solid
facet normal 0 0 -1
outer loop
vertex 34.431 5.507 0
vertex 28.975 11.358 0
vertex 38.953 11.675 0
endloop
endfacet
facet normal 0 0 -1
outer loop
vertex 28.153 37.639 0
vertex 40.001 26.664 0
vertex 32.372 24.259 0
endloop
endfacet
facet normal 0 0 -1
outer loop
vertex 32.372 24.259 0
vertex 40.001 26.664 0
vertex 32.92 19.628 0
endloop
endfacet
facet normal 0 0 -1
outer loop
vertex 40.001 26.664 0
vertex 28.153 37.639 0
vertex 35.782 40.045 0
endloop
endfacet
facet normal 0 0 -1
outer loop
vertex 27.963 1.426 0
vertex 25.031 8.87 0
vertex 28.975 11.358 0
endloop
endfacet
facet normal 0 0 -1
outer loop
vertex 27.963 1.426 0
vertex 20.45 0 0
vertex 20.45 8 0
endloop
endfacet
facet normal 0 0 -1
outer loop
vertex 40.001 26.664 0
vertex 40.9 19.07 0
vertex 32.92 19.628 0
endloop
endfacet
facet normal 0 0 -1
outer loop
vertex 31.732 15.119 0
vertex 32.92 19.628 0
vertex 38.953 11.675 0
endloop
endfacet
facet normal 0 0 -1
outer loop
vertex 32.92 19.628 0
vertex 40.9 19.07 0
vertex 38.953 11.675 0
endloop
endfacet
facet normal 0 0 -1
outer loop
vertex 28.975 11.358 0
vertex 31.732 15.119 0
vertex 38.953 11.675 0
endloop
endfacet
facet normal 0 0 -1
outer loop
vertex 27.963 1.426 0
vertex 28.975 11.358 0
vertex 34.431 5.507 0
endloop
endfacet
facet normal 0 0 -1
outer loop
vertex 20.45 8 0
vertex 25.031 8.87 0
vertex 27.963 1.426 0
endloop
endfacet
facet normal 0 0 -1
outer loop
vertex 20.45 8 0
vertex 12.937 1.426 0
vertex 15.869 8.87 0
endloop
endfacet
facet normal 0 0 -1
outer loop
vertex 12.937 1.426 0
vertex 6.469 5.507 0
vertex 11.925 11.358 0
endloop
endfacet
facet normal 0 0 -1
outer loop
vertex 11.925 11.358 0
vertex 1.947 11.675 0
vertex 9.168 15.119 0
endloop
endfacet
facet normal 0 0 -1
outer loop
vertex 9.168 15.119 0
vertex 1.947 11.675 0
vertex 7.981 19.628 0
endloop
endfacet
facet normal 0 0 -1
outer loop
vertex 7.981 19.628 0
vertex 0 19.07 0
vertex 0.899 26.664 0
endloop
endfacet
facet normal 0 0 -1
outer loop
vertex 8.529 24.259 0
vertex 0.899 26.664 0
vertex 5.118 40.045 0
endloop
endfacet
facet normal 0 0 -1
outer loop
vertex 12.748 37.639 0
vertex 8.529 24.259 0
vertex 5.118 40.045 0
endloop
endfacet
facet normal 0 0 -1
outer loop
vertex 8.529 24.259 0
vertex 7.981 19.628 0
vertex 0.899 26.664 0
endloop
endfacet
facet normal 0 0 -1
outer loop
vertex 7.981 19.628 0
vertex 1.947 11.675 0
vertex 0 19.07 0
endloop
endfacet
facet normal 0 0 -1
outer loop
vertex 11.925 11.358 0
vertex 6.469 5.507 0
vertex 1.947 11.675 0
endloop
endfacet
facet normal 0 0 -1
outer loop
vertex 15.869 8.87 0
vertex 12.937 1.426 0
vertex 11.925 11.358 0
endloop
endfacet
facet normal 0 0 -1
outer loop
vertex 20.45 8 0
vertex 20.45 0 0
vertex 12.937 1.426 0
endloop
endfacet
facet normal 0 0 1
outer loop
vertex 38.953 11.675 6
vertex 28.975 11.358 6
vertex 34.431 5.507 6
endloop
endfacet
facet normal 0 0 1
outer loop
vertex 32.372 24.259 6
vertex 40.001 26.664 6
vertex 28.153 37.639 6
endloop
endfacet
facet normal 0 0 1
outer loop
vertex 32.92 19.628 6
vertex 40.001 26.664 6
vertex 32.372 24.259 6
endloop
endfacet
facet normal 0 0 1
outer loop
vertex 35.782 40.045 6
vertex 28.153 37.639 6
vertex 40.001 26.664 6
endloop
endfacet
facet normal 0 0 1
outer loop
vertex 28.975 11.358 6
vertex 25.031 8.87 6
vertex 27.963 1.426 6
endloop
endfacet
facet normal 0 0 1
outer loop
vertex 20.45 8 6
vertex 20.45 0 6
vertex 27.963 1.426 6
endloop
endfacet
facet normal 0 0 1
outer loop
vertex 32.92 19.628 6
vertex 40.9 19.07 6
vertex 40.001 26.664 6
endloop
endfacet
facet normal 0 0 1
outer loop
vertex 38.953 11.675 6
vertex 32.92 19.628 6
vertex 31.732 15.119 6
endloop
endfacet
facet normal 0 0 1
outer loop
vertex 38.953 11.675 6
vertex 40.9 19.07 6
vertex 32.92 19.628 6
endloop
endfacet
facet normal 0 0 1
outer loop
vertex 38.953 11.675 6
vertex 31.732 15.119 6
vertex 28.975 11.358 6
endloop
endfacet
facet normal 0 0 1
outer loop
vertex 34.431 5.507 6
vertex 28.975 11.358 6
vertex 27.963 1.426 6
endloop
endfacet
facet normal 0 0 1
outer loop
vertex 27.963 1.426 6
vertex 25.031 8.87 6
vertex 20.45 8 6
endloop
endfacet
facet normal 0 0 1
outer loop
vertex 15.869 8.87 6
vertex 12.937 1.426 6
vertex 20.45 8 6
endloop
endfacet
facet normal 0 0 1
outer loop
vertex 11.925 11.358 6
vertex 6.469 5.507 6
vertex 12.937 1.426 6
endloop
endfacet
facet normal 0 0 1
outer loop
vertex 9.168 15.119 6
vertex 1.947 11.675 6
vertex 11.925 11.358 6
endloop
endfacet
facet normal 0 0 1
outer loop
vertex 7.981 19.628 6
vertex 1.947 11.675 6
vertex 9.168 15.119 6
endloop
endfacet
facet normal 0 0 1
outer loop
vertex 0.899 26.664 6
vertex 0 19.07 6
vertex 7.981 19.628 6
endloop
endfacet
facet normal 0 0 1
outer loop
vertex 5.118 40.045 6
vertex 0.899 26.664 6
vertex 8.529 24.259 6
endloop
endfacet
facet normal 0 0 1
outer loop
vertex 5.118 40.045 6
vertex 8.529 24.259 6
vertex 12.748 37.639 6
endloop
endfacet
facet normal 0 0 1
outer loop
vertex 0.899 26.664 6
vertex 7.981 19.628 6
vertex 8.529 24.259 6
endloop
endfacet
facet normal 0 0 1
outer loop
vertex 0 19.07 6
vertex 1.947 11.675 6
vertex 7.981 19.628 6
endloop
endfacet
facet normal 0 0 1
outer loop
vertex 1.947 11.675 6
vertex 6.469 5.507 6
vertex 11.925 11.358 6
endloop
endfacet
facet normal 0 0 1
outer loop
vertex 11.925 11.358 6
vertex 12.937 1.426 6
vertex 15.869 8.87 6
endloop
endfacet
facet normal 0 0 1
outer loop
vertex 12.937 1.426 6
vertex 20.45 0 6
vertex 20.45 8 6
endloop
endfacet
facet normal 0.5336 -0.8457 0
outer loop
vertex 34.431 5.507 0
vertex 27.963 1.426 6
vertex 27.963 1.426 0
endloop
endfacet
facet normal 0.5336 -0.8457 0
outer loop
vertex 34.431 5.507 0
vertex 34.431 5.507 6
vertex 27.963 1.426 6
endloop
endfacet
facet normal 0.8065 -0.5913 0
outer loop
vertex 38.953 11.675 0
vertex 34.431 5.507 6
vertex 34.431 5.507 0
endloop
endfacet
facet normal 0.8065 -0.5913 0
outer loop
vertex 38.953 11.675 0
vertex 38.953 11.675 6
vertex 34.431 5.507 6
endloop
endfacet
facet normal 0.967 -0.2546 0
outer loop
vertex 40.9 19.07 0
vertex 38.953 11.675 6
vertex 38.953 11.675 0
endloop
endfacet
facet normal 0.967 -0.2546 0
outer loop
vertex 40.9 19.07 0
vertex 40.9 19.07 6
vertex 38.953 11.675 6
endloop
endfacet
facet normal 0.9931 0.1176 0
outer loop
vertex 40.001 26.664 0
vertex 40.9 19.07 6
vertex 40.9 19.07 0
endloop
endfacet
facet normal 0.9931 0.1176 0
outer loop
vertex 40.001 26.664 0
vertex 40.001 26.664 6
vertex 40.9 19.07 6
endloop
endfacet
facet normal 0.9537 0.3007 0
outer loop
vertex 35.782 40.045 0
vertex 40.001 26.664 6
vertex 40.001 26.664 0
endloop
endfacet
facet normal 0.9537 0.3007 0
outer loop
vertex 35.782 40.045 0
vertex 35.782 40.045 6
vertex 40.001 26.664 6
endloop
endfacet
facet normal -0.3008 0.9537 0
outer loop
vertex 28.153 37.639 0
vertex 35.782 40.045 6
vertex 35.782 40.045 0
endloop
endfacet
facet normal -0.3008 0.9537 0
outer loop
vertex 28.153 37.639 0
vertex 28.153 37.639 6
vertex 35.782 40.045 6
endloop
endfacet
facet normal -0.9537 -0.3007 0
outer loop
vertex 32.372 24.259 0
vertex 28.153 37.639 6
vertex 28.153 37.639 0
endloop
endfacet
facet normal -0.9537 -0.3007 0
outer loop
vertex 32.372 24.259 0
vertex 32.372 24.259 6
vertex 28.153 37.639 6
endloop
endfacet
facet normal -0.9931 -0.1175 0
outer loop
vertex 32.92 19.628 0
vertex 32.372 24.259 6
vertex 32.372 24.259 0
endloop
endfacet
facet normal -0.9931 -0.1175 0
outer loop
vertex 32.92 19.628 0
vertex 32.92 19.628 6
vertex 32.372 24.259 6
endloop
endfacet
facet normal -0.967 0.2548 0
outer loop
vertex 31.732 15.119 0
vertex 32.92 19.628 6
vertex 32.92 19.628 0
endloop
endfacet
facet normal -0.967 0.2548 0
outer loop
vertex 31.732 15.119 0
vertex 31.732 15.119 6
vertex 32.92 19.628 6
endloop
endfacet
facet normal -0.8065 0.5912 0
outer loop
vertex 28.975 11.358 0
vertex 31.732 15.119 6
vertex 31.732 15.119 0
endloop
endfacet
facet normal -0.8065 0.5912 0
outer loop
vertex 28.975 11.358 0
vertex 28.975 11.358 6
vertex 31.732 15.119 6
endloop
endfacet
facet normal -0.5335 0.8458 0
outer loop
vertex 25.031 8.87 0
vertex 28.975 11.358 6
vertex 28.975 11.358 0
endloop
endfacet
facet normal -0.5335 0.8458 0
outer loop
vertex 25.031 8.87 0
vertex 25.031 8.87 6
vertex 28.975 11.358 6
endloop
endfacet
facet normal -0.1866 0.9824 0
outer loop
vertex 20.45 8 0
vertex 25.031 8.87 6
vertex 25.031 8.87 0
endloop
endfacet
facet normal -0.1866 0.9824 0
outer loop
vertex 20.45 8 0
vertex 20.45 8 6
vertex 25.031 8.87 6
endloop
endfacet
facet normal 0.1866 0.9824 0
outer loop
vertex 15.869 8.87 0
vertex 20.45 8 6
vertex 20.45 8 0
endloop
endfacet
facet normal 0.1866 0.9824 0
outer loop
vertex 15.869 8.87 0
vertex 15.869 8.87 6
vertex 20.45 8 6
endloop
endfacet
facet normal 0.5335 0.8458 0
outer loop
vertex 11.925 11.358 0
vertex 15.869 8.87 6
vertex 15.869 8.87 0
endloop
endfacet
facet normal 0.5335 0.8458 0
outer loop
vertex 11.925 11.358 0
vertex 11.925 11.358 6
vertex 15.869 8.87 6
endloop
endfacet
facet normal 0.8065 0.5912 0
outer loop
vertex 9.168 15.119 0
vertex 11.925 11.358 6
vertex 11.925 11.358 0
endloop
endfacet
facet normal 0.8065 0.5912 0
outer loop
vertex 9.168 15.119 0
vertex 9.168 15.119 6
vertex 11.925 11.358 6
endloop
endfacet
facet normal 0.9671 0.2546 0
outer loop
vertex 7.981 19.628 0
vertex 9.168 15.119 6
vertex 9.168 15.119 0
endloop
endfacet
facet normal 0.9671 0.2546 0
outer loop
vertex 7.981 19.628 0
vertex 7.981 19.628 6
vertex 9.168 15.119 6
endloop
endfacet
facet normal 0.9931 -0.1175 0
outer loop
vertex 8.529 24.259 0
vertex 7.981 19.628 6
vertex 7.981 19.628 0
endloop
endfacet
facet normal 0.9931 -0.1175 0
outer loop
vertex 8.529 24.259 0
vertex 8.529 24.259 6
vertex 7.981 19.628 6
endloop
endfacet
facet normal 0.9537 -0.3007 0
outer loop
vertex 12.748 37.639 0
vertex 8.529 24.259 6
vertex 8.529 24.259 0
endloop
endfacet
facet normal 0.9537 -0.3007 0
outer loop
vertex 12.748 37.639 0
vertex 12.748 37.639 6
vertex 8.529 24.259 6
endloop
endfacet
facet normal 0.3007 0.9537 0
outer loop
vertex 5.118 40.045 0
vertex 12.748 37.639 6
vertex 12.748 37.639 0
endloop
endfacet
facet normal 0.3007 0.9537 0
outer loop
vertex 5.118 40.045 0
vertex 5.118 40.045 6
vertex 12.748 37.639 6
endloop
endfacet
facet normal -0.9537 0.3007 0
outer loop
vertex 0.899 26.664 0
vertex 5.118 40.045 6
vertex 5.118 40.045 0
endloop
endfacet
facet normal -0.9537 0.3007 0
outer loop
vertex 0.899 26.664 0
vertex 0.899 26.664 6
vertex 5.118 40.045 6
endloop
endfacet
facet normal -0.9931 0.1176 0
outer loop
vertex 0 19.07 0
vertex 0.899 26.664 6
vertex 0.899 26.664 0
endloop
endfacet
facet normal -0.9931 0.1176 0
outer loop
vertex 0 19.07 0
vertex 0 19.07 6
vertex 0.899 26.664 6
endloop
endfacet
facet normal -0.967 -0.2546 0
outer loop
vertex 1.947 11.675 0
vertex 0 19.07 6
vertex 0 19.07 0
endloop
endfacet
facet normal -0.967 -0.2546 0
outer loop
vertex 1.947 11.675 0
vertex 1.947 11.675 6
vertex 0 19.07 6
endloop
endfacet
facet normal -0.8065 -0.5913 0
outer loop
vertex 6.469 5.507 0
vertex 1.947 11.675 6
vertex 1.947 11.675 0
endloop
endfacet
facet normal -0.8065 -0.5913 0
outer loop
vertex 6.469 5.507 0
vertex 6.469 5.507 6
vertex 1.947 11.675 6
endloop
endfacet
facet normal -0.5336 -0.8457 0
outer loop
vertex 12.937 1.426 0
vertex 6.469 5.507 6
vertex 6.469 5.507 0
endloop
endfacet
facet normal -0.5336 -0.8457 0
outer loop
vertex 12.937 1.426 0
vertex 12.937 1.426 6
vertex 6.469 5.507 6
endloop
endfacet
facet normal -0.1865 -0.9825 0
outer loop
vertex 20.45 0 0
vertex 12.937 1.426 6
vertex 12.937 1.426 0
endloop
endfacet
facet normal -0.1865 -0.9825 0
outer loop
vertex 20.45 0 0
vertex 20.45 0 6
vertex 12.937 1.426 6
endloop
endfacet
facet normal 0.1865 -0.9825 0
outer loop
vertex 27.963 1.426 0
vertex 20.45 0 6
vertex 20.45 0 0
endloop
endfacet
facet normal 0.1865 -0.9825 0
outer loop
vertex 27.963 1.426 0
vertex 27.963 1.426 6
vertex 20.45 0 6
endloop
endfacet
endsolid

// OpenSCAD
$fn = 32;

// ----------------------------------------------------------------------
// Clip blank: omega clip, 6 mm thick
// ----------------------------------------------------------------------

// --- parameters (mm) ---
profile_height = 6;       // extrusion height
profile_points = 26;      // points of the closed outline

profile = [[0.899, 26.664], [0, 19.07], [1.947, 11.675], [6.469, 5.507], [12.937, 1.426], [20.45, 0], [27.963, 1.426], [34.431, 5.507], [38.953, 11.675], [40.9, 19.07], [40.001, 26.664], [35.782, 40.045], [28.153, 37.639], [32.372, 24.259], [32.92, 19.628], [31.732, 15.119], [28.975, 11.358], [25.031, 8.87], [20.45, 8], [15.869, 8.87], [11.925, 11.358], [9.168, 15.119], [7.981, 19.628], [8.529, 24.259], [12.748, 37.639], [5.118, 40.045]];  // single closed polygon, 26 points, counter clockwise

// --- the one profile operation ---
linear_extrude(height = profile_height) polygon(points = profile);
